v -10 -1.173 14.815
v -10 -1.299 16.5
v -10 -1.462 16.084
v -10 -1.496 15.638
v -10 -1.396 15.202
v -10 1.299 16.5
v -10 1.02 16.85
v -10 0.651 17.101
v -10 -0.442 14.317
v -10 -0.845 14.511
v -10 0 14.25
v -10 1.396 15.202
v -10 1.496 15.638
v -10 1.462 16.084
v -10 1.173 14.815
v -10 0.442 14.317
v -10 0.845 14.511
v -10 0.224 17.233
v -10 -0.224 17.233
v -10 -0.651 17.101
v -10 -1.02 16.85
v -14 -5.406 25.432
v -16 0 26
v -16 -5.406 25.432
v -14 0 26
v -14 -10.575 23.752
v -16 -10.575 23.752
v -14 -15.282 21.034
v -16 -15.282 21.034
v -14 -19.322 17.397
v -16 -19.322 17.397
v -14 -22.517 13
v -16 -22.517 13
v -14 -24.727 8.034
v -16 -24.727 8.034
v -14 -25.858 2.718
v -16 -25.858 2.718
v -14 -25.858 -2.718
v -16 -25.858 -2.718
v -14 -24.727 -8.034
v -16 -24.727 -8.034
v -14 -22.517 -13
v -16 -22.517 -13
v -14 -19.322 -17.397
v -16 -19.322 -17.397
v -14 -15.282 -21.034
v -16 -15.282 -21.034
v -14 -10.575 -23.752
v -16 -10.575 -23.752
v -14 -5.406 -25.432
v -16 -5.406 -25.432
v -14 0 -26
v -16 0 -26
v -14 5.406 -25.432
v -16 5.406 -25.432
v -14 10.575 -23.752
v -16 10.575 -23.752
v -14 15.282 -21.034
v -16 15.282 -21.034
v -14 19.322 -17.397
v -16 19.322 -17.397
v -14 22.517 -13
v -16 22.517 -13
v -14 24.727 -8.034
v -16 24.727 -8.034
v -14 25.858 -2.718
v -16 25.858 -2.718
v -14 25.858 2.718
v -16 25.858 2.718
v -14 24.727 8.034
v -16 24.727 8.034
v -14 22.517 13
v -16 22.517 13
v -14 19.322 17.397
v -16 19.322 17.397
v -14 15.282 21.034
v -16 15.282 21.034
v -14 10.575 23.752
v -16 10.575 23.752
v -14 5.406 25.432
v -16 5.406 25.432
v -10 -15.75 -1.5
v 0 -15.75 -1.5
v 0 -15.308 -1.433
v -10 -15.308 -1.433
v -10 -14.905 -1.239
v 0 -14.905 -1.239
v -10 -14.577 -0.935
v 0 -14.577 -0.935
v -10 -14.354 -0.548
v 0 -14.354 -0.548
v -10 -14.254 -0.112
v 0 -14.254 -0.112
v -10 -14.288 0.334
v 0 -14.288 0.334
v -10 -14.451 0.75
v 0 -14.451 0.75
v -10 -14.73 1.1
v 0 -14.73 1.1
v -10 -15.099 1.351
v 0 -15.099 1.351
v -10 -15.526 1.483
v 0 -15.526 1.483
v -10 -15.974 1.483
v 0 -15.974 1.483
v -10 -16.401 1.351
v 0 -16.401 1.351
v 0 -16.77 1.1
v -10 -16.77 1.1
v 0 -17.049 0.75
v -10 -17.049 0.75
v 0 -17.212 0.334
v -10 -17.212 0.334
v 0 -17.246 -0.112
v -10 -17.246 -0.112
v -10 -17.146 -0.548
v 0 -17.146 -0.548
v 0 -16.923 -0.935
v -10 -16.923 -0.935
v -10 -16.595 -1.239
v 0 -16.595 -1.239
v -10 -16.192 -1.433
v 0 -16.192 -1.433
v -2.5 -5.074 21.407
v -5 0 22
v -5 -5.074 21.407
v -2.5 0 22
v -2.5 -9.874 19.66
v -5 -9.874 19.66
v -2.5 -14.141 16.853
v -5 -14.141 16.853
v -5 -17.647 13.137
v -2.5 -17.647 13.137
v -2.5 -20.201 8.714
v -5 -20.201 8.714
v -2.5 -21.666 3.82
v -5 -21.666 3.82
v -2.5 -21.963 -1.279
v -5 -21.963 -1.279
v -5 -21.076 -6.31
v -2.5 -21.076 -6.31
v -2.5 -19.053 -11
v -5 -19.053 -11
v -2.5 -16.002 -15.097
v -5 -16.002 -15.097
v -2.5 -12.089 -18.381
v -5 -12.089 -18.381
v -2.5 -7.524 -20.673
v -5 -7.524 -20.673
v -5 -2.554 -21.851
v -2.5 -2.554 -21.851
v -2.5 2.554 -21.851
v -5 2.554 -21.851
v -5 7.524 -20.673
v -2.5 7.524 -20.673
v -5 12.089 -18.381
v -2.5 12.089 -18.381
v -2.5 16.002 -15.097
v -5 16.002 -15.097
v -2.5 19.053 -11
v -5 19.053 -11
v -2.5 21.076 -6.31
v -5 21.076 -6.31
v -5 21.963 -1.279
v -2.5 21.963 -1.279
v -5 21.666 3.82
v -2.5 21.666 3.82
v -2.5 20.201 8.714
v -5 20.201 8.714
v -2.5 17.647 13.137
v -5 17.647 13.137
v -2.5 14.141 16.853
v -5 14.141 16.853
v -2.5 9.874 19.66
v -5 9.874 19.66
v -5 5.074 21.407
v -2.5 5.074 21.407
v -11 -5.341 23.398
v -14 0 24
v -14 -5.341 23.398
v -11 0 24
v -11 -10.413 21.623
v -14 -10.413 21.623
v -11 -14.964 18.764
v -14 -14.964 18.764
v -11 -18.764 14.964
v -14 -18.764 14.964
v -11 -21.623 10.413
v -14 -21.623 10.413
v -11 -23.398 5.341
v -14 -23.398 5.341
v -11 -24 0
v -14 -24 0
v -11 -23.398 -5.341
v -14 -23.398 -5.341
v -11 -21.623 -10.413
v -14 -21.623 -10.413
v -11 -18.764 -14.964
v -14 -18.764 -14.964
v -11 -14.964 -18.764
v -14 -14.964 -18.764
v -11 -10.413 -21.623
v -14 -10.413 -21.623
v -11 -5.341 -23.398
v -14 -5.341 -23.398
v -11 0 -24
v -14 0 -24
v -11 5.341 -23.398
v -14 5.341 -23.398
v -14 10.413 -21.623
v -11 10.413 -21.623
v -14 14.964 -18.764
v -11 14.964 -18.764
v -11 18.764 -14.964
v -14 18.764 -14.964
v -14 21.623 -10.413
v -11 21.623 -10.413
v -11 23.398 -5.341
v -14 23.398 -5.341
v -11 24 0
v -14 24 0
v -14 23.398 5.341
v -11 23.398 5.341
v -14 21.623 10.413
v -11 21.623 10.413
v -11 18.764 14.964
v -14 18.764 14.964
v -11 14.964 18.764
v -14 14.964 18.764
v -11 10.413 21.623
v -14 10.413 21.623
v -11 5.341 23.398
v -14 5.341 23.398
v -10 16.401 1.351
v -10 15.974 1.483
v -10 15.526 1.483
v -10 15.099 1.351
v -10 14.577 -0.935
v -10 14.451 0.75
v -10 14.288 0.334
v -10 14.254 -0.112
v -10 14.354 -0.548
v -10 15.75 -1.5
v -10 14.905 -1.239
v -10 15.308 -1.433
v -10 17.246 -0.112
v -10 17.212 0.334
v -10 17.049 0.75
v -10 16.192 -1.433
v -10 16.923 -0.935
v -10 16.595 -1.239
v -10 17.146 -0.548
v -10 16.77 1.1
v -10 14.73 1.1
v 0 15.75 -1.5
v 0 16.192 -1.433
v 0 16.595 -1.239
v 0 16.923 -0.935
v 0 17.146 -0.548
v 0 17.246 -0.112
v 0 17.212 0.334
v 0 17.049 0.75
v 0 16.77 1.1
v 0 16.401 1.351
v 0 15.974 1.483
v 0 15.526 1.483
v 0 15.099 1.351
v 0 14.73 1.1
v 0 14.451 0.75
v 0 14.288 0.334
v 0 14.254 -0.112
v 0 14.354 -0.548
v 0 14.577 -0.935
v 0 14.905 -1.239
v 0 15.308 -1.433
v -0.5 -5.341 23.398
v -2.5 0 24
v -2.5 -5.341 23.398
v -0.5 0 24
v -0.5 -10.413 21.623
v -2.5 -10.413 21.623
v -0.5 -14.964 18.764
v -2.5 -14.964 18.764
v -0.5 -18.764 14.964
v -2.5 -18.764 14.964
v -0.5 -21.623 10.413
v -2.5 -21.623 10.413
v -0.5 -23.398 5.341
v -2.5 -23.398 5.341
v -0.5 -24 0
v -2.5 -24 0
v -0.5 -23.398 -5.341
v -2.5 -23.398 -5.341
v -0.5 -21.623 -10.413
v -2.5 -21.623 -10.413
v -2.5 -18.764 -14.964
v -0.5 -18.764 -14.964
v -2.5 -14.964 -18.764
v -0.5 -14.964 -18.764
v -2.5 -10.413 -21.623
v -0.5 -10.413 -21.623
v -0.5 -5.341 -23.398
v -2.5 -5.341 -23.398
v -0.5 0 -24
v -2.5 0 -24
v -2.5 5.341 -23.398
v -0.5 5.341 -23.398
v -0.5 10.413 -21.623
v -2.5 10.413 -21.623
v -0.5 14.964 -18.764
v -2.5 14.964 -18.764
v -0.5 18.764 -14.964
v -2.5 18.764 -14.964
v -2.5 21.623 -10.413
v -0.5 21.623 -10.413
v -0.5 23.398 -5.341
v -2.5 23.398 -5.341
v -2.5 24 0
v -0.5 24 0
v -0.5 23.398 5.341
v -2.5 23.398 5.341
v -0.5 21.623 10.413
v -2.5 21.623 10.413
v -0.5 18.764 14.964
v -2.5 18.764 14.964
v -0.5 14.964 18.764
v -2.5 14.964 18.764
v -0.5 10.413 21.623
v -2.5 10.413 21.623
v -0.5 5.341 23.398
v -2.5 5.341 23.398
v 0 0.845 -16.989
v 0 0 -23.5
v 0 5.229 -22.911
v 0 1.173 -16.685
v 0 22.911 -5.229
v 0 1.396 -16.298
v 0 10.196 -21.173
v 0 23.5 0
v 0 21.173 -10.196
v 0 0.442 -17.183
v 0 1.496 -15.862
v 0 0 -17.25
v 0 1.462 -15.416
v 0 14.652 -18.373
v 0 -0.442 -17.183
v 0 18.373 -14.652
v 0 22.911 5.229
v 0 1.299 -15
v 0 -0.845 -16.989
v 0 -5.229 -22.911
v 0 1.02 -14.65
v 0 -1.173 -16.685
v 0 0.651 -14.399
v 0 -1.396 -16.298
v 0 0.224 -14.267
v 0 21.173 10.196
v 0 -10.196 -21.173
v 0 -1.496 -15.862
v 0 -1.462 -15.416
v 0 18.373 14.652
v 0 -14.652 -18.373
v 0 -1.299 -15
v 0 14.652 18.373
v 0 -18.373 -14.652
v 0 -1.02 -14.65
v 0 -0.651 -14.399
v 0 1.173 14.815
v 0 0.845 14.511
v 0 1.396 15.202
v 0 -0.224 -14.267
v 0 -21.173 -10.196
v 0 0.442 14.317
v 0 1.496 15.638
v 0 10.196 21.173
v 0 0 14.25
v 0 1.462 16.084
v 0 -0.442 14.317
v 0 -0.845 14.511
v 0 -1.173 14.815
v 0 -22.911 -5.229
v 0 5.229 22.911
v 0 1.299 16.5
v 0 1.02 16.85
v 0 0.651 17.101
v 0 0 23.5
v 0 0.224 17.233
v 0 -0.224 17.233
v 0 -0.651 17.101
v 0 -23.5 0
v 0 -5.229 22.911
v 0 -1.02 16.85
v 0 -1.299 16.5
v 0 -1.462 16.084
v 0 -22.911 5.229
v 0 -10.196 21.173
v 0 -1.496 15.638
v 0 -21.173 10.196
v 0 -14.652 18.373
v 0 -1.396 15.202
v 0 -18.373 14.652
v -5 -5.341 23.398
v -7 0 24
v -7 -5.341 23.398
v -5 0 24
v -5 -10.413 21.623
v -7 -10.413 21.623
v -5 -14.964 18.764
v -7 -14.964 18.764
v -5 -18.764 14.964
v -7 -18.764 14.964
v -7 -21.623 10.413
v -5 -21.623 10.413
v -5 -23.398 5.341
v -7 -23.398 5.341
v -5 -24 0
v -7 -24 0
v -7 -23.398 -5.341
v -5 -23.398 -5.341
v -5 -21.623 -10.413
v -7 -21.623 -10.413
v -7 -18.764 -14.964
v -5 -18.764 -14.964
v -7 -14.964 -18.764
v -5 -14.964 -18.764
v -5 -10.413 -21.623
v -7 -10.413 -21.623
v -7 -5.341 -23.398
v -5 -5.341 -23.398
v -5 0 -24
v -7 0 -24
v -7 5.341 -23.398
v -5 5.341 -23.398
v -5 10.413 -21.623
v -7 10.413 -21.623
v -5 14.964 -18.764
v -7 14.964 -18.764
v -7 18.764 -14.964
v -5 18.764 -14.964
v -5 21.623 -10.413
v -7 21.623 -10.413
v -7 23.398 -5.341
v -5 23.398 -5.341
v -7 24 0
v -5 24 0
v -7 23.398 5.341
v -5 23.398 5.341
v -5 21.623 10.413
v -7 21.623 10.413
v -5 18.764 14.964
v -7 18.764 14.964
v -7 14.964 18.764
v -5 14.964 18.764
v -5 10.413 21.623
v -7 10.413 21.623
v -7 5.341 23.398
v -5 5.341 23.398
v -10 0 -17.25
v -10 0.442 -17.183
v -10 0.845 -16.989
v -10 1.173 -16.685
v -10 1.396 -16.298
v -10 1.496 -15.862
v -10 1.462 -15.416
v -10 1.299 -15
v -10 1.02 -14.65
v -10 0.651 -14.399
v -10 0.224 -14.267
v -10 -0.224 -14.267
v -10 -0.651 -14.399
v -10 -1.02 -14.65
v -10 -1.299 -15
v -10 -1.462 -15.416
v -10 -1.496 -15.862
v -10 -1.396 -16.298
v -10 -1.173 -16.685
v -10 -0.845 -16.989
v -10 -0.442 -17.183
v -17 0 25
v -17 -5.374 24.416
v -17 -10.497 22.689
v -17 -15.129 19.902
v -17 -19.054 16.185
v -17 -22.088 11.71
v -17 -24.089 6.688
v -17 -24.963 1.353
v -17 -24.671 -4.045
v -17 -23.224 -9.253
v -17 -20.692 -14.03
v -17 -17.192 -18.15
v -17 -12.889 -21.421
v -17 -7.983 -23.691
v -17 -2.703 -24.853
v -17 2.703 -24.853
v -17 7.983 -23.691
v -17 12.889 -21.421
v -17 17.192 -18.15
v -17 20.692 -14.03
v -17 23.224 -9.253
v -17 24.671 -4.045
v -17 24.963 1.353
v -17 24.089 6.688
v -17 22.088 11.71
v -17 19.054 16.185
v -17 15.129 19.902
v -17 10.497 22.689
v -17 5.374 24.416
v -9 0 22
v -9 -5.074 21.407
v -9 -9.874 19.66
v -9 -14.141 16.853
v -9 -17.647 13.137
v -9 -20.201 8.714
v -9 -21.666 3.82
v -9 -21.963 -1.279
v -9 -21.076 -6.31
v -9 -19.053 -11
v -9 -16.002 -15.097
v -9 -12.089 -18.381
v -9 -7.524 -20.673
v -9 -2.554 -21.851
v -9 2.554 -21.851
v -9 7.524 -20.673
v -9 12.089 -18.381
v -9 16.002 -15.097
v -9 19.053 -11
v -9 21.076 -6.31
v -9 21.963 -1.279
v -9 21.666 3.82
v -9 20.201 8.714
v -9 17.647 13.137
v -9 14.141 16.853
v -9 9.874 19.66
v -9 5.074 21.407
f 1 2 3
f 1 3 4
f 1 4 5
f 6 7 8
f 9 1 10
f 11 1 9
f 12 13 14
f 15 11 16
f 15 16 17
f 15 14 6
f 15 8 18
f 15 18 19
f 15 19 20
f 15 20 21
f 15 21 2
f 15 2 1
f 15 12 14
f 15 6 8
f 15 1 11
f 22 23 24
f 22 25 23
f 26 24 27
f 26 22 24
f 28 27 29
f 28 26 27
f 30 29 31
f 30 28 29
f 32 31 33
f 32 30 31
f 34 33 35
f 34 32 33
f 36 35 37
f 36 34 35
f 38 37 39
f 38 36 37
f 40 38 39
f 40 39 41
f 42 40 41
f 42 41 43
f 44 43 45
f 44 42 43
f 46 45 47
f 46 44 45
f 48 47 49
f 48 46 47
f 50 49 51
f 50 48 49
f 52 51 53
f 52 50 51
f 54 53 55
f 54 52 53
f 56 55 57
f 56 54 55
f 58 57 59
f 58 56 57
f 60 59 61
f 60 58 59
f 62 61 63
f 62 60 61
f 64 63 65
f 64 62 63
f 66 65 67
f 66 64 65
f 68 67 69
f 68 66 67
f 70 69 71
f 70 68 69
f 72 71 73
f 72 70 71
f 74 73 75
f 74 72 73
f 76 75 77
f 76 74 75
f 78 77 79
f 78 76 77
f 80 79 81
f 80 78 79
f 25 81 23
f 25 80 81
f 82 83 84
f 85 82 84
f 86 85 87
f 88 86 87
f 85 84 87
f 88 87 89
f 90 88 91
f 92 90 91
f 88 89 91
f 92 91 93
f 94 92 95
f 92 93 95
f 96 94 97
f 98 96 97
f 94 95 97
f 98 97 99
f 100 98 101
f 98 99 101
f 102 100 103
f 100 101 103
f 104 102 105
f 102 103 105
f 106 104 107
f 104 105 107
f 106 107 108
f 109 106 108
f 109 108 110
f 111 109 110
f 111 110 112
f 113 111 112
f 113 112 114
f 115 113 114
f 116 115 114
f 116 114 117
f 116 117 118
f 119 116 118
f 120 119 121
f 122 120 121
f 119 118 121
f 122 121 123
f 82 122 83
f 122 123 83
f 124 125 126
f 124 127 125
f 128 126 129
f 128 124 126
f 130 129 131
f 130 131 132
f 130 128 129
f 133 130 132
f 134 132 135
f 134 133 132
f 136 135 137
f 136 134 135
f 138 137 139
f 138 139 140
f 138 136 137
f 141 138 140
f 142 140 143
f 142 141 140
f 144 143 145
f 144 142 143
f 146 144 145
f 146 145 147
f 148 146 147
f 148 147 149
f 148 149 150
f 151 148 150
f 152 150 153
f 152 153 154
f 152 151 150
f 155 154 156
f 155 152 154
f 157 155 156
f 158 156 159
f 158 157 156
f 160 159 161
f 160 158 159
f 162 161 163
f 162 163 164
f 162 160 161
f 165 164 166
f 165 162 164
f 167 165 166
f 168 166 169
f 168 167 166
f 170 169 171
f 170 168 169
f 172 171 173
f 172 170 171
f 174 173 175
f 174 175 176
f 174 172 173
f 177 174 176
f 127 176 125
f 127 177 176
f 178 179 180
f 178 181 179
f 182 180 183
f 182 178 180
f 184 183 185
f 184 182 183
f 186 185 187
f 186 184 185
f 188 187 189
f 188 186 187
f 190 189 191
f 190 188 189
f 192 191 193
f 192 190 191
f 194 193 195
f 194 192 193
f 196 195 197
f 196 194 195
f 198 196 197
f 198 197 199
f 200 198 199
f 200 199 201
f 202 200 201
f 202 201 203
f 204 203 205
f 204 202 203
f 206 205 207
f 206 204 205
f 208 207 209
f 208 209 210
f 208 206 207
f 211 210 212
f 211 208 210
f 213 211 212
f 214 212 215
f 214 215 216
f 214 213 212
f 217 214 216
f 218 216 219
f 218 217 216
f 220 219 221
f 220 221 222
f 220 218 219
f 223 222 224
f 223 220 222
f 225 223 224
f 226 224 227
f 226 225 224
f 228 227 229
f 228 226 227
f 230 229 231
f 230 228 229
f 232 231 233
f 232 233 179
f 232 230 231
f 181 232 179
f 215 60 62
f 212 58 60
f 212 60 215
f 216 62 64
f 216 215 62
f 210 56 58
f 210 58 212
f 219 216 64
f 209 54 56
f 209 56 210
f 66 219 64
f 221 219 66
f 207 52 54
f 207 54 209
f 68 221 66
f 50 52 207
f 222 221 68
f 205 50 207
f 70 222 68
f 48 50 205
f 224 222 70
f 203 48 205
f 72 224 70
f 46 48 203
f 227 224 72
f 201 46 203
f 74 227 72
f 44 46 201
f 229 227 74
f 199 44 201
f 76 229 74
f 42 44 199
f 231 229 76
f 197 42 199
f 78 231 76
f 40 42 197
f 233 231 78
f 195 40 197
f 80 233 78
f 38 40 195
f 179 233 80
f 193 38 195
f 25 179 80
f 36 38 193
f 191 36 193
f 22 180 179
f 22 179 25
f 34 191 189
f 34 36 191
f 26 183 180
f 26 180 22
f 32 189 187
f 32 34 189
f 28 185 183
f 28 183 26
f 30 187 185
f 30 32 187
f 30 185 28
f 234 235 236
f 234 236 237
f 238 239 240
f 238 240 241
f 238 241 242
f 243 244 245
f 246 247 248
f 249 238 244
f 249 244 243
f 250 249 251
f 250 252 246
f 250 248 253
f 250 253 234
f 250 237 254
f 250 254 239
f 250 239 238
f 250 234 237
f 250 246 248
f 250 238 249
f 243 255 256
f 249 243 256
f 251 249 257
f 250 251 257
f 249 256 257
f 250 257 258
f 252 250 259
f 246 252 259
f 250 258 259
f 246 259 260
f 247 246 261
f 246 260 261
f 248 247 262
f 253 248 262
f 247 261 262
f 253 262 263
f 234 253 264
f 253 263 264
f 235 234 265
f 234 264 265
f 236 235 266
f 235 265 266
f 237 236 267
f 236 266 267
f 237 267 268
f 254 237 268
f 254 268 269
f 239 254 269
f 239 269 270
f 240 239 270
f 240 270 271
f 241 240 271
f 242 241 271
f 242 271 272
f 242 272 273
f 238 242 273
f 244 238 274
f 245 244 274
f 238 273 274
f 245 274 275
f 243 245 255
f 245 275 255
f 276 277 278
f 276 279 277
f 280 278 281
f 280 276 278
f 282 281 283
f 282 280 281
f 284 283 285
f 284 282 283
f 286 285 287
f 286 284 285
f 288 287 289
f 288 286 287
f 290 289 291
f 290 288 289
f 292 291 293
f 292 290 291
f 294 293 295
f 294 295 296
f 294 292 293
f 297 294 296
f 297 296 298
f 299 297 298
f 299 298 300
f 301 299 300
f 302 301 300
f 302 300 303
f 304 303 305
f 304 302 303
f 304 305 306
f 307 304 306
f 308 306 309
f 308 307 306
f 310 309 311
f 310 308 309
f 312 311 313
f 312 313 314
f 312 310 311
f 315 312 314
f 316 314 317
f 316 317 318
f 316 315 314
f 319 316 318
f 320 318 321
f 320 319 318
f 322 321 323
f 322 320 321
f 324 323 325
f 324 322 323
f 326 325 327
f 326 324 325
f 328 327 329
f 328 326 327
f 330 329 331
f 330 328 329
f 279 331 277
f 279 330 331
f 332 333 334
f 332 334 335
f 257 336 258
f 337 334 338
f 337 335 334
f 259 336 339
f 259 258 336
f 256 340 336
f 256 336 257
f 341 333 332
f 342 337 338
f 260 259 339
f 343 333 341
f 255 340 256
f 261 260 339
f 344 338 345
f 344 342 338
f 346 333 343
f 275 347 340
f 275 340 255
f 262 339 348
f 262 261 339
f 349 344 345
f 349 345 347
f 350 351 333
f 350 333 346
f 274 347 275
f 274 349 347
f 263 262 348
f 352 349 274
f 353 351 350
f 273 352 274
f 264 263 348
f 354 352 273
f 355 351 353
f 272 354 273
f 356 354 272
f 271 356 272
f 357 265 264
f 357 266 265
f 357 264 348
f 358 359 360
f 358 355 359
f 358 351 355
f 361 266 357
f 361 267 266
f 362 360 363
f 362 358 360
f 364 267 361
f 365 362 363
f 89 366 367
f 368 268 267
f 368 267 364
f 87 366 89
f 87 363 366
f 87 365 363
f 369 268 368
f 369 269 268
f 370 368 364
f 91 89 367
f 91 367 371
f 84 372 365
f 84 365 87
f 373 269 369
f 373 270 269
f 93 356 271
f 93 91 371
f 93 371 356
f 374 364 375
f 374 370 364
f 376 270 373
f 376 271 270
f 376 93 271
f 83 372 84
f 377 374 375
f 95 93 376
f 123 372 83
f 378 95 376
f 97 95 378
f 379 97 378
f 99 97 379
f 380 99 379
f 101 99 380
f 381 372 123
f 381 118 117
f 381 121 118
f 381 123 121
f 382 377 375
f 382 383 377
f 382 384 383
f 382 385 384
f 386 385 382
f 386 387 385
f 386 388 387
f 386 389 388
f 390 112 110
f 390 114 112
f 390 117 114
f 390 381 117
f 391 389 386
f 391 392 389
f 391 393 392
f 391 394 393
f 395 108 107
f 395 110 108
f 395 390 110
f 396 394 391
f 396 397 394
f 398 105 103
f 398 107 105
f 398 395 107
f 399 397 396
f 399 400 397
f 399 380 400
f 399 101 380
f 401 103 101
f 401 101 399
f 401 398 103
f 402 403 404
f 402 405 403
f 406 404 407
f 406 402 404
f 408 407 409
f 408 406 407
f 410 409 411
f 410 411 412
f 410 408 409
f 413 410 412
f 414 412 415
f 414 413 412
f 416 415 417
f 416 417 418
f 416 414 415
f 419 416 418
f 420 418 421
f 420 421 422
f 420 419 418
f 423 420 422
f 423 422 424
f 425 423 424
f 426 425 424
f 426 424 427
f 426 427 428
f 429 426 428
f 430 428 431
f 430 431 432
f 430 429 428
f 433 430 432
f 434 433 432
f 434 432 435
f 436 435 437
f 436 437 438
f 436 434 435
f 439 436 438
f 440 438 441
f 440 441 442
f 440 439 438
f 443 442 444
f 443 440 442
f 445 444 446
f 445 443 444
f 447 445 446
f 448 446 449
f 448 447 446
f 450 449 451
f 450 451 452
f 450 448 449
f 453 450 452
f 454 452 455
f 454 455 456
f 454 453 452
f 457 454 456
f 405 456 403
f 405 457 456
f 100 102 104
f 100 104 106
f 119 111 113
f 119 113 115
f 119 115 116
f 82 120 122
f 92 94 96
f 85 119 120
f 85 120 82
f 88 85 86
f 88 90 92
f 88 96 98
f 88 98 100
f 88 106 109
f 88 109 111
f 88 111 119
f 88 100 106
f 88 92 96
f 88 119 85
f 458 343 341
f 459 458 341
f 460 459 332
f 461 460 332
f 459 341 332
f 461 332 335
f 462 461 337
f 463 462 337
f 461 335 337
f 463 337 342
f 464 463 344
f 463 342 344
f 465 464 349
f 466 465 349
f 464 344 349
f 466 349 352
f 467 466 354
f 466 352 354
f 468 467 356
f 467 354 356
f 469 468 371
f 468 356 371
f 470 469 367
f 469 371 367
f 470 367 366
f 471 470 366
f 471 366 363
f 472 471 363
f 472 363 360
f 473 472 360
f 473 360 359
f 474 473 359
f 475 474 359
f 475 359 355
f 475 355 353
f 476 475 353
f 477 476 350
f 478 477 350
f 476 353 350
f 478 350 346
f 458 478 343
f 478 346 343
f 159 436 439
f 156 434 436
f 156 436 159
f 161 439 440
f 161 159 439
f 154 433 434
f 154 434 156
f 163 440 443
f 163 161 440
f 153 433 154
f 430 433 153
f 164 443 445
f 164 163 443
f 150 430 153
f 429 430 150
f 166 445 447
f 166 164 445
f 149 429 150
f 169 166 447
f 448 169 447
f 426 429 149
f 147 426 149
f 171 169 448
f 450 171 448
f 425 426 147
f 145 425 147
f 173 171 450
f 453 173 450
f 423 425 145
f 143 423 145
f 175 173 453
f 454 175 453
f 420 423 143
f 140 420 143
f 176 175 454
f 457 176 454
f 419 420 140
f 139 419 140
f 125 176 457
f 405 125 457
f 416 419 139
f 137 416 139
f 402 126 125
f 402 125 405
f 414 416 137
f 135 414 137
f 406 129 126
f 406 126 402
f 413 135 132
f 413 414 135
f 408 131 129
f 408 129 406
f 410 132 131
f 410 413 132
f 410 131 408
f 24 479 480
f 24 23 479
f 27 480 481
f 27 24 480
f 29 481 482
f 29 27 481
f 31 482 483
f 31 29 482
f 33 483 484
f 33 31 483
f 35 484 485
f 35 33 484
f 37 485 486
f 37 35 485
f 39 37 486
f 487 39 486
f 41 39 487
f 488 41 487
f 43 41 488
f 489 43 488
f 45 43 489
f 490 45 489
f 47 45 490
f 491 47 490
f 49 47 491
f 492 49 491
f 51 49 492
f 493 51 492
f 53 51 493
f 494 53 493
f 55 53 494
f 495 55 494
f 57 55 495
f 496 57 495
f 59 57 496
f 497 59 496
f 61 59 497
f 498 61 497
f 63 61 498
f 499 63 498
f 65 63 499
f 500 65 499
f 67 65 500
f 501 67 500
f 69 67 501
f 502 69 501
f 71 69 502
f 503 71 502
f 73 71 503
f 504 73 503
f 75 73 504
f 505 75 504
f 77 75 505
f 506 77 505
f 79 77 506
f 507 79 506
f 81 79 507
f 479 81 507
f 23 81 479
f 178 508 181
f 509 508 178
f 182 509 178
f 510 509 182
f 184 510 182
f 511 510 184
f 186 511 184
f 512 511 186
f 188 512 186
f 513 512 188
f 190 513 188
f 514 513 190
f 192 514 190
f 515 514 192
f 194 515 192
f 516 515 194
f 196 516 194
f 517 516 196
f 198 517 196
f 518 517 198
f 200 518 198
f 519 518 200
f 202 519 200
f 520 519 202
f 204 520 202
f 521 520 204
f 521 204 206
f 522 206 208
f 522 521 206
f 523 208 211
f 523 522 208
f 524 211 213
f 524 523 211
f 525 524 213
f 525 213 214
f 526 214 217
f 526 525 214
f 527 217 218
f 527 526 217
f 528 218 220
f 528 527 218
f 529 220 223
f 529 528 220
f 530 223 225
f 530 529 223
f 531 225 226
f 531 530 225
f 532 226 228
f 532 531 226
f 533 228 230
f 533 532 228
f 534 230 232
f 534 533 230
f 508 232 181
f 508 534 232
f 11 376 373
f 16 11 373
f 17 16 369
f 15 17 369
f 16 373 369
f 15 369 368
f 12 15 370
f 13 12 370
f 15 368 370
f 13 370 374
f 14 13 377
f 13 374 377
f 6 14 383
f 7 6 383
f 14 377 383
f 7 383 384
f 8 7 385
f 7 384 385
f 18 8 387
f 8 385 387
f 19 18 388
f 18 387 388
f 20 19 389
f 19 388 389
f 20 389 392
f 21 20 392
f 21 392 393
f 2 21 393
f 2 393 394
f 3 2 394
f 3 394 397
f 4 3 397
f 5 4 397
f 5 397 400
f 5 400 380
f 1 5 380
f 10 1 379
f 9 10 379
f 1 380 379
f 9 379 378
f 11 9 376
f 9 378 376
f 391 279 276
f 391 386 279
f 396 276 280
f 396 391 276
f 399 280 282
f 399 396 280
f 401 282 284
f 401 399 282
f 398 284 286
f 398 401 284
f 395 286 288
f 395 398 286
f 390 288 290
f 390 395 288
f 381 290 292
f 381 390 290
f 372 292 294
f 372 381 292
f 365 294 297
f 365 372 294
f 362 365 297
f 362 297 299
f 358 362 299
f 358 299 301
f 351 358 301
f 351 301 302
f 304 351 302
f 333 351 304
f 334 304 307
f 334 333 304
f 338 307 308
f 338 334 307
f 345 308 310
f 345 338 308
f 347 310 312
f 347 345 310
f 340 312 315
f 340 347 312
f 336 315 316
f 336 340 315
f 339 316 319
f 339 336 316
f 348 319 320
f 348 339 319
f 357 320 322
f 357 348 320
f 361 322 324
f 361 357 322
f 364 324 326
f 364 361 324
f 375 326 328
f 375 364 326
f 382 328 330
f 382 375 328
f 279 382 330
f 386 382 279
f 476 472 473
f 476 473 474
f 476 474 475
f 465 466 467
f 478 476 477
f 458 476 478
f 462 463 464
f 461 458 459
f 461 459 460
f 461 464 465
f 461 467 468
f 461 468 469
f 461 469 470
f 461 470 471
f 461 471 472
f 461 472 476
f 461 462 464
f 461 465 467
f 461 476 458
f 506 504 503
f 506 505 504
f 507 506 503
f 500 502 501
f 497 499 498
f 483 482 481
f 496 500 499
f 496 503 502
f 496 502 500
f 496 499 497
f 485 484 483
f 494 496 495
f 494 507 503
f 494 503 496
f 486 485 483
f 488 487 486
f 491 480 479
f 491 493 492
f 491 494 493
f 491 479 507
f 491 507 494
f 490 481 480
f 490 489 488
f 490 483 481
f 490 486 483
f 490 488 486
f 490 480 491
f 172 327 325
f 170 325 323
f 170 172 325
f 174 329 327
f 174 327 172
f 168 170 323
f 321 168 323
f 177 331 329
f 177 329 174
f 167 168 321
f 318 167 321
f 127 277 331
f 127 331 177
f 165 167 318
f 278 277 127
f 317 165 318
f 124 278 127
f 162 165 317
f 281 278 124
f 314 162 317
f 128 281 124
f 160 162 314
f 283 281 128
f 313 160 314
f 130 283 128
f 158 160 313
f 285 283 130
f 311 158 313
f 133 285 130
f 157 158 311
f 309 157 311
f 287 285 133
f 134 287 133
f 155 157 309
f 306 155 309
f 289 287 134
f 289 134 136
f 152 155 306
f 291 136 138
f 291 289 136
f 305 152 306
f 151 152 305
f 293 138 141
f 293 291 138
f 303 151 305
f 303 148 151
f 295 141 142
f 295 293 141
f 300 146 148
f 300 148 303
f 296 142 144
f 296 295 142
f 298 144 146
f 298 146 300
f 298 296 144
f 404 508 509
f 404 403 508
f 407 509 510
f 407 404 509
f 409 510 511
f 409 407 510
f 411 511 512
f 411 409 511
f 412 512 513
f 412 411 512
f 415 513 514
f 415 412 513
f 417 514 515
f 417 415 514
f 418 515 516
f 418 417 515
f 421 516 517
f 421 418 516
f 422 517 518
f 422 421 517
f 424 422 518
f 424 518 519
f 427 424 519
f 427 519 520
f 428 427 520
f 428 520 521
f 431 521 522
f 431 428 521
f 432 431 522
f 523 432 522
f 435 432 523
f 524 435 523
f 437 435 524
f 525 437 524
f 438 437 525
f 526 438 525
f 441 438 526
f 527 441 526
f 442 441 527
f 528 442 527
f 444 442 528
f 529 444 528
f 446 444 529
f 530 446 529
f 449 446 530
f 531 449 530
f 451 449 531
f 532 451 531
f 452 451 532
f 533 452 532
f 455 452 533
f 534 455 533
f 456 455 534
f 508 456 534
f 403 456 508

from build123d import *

# Parameters (mm, degrees)
SKETCH_2_R          = 1.5
CUT_EXTRUDE_1_DEPTH = 10


with BuildPart() as part:
    # Эскиз1 → Повернуть1 (revolve)
    with BuildSketch(Plane.XY, mode=Mode.PRIVATE) as revolve_1_sk:
        Polygon((-17, 0), (-17, 25), (-16, 26), (-14, 26), (-14, 24), (-11, 24), (-9, 22), (-7, 24), (-5, 24), (-5, 22), (-2.5, 22), (-2.5, 24), (-0.5, 24), (0, 23.5), (0, 0), align=None)
    revolve(revolve_1_sk.sketch.rotate(Axis((0, 0, 0), (1, 0, 0)), 90), axis=Axis((0, 0, 0), (1, 0, 0)))

    # Эскиз2 → Вырез-Вытянуть1 (cut)
    with BuildSketch(Plane(origin=(0, 0, 0), x_dir=(0, 0, -1), z_dir=(1, 0, 0))):
        with Locations((0, 15.75)):
            Circle(SKETCH_2_R)
        with Locations((15.75, 0)):
            Circle(SKETCH_2_R)
        with Locations((-15.75, 0)):
            Circle(SKETCH_2_R)
        with Locations((0, -15.75)):
            Circle(SKETCH_2_R)
    extrude(amount=-CUT_EXTRUDE_1_DEPTH, mode=Mode.SUBTRACT)


solid = part.part
